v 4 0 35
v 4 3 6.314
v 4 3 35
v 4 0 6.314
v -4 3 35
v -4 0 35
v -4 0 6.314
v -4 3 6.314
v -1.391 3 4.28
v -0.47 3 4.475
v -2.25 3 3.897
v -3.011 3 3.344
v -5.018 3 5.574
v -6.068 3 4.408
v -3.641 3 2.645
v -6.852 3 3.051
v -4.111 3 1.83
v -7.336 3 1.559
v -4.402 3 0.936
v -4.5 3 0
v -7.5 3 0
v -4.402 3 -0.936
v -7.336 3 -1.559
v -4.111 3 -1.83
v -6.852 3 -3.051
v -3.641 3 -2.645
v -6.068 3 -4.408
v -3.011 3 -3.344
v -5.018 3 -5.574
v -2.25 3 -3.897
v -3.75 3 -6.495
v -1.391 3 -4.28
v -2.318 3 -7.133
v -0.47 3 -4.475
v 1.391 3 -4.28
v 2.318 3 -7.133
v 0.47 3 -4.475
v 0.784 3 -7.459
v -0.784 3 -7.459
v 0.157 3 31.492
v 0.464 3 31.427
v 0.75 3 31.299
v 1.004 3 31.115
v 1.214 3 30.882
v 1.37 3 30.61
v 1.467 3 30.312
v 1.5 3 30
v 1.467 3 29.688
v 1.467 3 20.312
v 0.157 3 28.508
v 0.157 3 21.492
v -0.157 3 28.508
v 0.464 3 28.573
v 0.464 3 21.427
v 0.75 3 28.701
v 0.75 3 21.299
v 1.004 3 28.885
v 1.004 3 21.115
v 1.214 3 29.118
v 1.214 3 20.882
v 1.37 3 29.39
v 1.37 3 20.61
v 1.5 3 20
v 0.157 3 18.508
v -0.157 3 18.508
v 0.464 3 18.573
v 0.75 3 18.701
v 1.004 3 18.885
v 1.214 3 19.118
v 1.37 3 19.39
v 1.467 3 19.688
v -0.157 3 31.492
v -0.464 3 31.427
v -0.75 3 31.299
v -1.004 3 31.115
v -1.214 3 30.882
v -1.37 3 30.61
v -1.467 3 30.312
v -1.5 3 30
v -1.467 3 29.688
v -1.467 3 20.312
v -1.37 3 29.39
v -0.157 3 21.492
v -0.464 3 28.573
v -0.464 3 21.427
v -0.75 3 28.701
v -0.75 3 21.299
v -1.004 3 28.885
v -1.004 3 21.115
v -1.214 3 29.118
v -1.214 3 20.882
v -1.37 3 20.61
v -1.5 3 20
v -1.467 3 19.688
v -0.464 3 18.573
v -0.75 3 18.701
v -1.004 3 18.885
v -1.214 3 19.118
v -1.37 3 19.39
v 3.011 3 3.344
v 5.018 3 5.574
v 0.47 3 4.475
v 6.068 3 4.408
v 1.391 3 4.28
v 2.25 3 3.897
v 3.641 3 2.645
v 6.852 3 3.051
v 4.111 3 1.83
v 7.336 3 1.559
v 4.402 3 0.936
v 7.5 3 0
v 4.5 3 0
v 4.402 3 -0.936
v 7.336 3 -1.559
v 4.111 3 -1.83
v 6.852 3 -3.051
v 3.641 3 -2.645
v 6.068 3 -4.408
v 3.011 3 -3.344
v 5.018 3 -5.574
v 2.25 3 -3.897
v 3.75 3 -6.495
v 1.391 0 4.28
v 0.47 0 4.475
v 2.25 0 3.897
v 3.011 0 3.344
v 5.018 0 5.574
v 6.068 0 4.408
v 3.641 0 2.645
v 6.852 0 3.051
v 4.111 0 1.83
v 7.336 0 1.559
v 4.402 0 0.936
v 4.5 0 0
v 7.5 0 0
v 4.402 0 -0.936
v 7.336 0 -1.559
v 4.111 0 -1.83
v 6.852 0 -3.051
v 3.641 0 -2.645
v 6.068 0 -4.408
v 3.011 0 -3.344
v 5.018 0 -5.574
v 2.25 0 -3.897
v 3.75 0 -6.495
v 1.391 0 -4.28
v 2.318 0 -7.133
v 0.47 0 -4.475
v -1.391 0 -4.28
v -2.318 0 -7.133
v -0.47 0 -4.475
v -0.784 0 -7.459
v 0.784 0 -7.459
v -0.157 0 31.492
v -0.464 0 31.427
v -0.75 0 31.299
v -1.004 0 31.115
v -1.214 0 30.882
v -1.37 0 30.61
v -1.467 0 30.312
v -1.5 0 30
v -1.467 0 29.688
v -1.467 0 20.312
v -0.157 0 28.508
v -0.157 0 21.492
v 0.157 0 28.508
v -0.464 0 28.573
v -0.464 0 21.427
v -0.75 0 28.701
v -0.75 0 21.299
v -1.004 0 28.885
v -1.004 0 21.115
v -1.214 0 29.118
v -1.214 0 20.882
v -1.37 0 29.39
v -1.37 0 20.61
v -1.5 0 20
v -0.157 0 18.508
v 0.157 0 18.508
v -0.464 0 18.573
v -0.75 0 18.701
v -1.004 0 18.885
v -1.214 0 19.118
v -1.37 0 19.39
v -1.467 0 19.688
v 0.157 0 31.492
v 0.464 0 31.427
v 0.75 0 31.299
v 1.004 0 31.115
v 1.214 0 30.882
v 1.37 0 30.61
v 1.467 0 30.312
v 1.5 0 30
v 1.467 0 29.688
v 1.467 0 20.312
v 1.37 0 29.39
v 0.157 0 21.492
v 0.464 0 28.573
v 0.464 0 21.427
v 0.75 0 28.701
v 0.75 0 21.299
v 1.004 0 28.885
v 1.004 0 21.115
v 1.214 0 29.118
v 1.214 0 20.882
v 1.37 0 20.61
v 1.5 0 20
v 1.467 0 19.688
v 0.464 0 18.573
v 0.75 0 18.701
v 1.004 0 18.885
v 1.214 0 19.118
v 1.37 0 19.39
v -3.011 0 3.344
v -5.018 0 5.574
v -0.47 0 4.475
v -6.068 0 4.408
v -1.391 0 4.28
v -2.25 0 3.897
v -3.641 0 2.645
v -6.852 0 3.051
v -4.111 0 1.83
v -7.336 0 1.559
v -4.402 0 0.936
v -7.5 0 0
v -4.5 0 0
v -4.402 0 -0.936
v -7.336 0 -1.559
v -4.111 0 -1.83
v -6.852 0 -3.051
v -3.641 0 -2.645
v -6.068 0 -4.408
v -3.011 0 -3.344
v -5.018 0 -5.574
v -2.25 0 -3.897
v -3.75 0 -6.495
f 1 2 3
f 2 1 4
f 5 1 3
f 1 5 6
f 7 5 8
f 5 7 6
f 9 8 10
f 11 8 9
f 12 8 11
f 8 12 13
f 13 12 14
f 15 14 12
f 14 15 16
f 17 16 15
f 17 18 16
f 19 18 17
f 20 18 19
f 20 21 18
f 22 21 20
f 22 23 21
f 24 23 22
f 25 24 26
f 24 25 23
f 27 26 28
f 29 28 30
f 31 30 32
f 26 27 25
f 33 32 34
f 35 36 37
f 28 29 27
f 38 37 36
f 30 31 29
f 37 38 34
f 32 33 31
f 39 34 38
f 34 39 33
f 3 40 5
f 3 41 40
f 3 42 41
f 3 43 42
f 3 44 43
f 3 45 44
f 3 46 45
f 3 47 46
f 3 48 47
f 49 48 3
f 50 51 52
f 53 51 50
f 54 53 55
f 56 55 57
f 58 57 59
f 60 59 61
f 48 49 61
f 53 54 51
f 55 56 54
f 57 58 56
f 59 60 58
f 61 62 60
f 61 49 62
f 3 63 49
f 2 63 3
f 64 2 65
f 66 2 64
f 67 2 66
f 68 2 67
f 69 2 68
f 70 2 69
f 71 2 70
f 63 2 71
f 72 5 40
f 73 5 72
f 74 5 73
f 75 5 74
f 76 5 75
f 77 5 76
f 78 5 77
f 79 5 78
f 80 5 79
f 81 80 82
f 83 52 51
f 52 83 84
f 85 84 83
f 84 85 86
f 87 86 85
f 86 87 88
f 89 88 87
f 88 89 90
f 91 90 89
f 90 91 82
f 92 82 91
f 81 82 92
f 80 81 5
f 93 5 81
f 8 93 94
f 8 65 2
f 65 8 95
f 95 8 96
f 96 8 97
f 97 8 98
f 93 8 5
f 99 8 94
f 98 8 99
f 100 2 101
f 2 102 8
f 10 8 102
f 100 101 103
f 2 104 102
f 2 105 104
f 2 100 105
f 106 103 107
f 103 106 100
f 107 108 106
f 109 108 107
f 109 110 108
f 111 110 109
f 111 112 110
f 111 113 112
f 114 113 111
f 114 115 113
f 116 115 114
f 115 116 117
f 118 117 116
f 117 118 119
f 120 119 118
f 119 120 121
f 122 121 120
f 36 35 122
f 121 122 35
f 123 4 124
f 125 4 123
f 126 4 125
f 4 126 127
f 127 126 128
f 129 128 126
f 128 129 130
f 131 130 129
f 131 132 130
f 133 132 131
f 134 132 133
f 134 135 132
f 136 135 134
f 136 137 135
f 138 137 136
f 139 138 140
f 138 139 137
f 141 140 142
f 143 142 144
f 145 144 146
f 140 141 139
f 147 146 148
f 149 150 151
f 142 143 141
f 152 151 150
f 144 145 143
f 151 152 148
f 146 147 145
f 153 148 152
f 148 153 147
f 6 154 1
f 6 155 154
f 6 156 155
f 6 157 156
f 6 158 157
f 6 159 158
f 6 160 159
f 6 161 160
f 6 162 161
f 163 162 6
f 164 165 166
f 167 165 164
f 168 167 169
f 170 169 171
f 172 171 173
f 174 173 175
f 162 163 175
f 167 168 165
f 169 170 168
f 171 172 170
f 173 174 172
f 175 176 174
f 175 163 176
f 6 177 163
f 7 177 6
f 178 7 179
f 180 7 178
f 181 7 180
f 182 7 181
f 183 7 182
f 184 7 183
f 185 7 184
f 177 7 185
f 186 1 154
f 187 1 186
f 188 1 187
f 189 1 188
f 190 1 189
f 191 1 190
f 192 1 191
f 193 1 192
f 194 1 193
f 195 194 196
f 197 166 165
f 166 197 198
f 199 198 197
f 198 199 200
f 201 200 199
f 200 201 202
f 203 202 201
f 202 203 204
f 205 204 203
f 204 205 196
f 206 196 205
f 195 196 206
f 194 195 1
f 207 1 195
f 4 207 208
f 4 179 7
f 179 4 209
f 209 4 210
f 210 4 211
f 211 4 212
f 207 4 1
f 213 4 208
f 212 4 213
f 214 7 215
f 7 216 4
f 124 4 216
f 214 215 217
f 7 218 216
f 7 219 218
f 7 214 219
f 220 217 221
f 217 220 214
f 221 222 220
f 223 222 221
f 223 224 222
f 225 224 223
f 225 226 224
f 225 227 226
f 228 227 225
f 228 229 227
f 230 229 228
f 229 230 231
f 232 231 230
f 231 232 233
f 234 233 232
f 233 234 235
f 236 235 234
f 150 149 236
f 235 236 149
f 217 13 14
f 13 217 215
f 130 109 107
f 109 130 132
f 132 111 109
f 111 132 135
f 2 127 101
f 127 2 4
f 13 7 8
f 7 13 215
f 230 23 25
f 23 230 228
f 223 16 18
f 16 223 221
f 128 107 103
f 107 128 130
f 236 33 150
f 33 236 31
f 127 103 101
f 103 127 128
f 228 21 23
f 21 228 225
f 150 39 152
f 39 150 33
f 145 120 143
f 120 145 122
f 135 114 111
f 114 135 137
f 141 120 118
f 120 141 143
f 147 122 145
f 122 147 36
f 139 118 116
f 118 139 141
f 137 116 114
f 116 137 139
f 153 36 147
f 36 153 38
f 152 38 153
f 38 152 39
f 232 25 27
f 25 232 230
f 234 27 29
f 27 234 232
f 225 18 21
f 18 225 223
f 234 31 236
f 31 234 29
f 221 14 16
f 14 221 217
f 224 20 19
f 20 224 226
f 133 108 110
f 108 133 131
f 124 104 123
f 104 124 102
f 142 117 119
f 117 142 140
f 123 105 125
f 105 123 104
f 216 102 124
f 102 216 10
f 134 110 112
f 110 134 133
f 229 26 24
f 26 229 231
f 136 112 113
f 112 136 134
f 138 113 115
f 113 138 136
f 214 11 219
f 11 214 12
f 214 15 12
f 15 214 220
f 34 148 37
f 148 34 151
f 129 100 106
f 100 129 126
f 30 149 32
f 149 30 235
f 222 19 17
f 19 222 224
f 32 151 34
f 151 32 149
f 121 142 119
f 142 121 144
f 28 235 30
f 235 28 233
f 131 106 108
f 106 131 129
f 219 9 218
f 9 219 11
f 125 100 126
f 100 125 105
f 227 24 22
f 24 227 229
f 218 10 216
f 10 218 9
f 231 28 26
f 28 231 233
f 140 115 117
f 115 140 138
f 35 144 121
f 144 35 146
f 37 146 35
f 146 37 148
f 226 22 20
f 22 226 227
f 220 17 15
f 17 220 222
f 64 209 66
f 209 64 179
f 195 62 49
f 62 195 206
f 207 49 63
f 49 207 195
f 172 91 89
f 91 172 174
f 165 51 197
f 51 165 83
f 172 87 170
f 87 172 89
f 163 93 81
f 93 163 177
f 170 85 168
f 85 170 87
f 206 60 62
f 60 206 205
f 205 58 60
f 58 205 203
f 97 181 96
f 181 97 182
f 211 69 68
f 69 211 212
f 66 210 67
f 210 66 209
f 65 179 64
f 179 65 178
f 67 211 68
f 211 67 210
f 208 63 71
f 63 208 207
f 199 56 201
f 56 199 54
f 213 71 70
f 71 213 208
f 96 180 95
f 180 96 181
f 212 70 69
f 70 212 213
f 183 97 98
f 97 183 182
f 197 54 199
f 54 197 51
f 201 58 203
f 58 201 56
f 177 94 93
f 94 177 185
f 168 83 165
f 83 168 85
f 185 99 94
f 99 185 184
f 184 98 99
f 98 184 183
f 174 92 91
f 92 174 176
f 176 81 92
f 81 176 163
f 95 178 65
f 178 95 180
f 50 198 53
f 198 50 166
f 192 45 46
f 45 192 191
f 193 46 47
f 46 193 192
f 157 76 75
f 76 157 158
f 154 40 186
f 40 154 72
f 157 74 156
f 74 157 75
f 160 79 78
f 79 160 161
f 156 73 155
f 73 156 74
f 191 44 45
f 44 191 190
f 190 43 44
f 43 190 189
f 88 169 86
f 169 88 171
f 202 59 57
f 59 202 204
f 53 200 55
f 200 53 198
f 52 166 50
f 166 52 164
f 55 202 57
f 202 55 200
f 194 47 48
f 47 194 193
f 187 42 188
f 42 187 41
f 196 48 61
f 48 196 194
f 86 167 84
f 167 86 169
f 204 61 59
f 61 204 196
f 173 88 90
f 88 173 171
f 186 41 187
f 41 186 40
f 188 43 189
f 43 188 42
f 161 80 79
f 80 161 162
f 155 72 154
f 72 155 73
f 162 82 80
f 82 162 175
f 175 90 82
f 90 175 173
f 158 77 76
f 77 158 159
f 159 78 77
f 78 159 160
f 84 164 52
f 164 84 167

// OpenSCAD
difference(){
	union(){        
        translate([-4,0,0]){
           cube([8,3,35], center=false);
        }

        translate([0,3,0]){
            rotate(a = [90,0,0]) {
                cylinder(h=3, r=7.5, $fn=30, center=false);
            }
        }

        
	}
	union() {
        
        translate([0,10,0]){
            rotate(a = [90,0,0]) {
                cylinder(h=400, r=4.5, $fn=30, center=false);
            }
        }

        translate([0,10,20]){
            rotate(a = [90,0,0]) {
                cylinder(h=400, r=1.5, $fn=30, center=false);
            }
        }
        translate([0,10,30]){
            rotate(a = [90,0,0]) {
                cylinder(h=400, r=1.5, $fn=30, center=false);
            }
        }


	


	}
}
